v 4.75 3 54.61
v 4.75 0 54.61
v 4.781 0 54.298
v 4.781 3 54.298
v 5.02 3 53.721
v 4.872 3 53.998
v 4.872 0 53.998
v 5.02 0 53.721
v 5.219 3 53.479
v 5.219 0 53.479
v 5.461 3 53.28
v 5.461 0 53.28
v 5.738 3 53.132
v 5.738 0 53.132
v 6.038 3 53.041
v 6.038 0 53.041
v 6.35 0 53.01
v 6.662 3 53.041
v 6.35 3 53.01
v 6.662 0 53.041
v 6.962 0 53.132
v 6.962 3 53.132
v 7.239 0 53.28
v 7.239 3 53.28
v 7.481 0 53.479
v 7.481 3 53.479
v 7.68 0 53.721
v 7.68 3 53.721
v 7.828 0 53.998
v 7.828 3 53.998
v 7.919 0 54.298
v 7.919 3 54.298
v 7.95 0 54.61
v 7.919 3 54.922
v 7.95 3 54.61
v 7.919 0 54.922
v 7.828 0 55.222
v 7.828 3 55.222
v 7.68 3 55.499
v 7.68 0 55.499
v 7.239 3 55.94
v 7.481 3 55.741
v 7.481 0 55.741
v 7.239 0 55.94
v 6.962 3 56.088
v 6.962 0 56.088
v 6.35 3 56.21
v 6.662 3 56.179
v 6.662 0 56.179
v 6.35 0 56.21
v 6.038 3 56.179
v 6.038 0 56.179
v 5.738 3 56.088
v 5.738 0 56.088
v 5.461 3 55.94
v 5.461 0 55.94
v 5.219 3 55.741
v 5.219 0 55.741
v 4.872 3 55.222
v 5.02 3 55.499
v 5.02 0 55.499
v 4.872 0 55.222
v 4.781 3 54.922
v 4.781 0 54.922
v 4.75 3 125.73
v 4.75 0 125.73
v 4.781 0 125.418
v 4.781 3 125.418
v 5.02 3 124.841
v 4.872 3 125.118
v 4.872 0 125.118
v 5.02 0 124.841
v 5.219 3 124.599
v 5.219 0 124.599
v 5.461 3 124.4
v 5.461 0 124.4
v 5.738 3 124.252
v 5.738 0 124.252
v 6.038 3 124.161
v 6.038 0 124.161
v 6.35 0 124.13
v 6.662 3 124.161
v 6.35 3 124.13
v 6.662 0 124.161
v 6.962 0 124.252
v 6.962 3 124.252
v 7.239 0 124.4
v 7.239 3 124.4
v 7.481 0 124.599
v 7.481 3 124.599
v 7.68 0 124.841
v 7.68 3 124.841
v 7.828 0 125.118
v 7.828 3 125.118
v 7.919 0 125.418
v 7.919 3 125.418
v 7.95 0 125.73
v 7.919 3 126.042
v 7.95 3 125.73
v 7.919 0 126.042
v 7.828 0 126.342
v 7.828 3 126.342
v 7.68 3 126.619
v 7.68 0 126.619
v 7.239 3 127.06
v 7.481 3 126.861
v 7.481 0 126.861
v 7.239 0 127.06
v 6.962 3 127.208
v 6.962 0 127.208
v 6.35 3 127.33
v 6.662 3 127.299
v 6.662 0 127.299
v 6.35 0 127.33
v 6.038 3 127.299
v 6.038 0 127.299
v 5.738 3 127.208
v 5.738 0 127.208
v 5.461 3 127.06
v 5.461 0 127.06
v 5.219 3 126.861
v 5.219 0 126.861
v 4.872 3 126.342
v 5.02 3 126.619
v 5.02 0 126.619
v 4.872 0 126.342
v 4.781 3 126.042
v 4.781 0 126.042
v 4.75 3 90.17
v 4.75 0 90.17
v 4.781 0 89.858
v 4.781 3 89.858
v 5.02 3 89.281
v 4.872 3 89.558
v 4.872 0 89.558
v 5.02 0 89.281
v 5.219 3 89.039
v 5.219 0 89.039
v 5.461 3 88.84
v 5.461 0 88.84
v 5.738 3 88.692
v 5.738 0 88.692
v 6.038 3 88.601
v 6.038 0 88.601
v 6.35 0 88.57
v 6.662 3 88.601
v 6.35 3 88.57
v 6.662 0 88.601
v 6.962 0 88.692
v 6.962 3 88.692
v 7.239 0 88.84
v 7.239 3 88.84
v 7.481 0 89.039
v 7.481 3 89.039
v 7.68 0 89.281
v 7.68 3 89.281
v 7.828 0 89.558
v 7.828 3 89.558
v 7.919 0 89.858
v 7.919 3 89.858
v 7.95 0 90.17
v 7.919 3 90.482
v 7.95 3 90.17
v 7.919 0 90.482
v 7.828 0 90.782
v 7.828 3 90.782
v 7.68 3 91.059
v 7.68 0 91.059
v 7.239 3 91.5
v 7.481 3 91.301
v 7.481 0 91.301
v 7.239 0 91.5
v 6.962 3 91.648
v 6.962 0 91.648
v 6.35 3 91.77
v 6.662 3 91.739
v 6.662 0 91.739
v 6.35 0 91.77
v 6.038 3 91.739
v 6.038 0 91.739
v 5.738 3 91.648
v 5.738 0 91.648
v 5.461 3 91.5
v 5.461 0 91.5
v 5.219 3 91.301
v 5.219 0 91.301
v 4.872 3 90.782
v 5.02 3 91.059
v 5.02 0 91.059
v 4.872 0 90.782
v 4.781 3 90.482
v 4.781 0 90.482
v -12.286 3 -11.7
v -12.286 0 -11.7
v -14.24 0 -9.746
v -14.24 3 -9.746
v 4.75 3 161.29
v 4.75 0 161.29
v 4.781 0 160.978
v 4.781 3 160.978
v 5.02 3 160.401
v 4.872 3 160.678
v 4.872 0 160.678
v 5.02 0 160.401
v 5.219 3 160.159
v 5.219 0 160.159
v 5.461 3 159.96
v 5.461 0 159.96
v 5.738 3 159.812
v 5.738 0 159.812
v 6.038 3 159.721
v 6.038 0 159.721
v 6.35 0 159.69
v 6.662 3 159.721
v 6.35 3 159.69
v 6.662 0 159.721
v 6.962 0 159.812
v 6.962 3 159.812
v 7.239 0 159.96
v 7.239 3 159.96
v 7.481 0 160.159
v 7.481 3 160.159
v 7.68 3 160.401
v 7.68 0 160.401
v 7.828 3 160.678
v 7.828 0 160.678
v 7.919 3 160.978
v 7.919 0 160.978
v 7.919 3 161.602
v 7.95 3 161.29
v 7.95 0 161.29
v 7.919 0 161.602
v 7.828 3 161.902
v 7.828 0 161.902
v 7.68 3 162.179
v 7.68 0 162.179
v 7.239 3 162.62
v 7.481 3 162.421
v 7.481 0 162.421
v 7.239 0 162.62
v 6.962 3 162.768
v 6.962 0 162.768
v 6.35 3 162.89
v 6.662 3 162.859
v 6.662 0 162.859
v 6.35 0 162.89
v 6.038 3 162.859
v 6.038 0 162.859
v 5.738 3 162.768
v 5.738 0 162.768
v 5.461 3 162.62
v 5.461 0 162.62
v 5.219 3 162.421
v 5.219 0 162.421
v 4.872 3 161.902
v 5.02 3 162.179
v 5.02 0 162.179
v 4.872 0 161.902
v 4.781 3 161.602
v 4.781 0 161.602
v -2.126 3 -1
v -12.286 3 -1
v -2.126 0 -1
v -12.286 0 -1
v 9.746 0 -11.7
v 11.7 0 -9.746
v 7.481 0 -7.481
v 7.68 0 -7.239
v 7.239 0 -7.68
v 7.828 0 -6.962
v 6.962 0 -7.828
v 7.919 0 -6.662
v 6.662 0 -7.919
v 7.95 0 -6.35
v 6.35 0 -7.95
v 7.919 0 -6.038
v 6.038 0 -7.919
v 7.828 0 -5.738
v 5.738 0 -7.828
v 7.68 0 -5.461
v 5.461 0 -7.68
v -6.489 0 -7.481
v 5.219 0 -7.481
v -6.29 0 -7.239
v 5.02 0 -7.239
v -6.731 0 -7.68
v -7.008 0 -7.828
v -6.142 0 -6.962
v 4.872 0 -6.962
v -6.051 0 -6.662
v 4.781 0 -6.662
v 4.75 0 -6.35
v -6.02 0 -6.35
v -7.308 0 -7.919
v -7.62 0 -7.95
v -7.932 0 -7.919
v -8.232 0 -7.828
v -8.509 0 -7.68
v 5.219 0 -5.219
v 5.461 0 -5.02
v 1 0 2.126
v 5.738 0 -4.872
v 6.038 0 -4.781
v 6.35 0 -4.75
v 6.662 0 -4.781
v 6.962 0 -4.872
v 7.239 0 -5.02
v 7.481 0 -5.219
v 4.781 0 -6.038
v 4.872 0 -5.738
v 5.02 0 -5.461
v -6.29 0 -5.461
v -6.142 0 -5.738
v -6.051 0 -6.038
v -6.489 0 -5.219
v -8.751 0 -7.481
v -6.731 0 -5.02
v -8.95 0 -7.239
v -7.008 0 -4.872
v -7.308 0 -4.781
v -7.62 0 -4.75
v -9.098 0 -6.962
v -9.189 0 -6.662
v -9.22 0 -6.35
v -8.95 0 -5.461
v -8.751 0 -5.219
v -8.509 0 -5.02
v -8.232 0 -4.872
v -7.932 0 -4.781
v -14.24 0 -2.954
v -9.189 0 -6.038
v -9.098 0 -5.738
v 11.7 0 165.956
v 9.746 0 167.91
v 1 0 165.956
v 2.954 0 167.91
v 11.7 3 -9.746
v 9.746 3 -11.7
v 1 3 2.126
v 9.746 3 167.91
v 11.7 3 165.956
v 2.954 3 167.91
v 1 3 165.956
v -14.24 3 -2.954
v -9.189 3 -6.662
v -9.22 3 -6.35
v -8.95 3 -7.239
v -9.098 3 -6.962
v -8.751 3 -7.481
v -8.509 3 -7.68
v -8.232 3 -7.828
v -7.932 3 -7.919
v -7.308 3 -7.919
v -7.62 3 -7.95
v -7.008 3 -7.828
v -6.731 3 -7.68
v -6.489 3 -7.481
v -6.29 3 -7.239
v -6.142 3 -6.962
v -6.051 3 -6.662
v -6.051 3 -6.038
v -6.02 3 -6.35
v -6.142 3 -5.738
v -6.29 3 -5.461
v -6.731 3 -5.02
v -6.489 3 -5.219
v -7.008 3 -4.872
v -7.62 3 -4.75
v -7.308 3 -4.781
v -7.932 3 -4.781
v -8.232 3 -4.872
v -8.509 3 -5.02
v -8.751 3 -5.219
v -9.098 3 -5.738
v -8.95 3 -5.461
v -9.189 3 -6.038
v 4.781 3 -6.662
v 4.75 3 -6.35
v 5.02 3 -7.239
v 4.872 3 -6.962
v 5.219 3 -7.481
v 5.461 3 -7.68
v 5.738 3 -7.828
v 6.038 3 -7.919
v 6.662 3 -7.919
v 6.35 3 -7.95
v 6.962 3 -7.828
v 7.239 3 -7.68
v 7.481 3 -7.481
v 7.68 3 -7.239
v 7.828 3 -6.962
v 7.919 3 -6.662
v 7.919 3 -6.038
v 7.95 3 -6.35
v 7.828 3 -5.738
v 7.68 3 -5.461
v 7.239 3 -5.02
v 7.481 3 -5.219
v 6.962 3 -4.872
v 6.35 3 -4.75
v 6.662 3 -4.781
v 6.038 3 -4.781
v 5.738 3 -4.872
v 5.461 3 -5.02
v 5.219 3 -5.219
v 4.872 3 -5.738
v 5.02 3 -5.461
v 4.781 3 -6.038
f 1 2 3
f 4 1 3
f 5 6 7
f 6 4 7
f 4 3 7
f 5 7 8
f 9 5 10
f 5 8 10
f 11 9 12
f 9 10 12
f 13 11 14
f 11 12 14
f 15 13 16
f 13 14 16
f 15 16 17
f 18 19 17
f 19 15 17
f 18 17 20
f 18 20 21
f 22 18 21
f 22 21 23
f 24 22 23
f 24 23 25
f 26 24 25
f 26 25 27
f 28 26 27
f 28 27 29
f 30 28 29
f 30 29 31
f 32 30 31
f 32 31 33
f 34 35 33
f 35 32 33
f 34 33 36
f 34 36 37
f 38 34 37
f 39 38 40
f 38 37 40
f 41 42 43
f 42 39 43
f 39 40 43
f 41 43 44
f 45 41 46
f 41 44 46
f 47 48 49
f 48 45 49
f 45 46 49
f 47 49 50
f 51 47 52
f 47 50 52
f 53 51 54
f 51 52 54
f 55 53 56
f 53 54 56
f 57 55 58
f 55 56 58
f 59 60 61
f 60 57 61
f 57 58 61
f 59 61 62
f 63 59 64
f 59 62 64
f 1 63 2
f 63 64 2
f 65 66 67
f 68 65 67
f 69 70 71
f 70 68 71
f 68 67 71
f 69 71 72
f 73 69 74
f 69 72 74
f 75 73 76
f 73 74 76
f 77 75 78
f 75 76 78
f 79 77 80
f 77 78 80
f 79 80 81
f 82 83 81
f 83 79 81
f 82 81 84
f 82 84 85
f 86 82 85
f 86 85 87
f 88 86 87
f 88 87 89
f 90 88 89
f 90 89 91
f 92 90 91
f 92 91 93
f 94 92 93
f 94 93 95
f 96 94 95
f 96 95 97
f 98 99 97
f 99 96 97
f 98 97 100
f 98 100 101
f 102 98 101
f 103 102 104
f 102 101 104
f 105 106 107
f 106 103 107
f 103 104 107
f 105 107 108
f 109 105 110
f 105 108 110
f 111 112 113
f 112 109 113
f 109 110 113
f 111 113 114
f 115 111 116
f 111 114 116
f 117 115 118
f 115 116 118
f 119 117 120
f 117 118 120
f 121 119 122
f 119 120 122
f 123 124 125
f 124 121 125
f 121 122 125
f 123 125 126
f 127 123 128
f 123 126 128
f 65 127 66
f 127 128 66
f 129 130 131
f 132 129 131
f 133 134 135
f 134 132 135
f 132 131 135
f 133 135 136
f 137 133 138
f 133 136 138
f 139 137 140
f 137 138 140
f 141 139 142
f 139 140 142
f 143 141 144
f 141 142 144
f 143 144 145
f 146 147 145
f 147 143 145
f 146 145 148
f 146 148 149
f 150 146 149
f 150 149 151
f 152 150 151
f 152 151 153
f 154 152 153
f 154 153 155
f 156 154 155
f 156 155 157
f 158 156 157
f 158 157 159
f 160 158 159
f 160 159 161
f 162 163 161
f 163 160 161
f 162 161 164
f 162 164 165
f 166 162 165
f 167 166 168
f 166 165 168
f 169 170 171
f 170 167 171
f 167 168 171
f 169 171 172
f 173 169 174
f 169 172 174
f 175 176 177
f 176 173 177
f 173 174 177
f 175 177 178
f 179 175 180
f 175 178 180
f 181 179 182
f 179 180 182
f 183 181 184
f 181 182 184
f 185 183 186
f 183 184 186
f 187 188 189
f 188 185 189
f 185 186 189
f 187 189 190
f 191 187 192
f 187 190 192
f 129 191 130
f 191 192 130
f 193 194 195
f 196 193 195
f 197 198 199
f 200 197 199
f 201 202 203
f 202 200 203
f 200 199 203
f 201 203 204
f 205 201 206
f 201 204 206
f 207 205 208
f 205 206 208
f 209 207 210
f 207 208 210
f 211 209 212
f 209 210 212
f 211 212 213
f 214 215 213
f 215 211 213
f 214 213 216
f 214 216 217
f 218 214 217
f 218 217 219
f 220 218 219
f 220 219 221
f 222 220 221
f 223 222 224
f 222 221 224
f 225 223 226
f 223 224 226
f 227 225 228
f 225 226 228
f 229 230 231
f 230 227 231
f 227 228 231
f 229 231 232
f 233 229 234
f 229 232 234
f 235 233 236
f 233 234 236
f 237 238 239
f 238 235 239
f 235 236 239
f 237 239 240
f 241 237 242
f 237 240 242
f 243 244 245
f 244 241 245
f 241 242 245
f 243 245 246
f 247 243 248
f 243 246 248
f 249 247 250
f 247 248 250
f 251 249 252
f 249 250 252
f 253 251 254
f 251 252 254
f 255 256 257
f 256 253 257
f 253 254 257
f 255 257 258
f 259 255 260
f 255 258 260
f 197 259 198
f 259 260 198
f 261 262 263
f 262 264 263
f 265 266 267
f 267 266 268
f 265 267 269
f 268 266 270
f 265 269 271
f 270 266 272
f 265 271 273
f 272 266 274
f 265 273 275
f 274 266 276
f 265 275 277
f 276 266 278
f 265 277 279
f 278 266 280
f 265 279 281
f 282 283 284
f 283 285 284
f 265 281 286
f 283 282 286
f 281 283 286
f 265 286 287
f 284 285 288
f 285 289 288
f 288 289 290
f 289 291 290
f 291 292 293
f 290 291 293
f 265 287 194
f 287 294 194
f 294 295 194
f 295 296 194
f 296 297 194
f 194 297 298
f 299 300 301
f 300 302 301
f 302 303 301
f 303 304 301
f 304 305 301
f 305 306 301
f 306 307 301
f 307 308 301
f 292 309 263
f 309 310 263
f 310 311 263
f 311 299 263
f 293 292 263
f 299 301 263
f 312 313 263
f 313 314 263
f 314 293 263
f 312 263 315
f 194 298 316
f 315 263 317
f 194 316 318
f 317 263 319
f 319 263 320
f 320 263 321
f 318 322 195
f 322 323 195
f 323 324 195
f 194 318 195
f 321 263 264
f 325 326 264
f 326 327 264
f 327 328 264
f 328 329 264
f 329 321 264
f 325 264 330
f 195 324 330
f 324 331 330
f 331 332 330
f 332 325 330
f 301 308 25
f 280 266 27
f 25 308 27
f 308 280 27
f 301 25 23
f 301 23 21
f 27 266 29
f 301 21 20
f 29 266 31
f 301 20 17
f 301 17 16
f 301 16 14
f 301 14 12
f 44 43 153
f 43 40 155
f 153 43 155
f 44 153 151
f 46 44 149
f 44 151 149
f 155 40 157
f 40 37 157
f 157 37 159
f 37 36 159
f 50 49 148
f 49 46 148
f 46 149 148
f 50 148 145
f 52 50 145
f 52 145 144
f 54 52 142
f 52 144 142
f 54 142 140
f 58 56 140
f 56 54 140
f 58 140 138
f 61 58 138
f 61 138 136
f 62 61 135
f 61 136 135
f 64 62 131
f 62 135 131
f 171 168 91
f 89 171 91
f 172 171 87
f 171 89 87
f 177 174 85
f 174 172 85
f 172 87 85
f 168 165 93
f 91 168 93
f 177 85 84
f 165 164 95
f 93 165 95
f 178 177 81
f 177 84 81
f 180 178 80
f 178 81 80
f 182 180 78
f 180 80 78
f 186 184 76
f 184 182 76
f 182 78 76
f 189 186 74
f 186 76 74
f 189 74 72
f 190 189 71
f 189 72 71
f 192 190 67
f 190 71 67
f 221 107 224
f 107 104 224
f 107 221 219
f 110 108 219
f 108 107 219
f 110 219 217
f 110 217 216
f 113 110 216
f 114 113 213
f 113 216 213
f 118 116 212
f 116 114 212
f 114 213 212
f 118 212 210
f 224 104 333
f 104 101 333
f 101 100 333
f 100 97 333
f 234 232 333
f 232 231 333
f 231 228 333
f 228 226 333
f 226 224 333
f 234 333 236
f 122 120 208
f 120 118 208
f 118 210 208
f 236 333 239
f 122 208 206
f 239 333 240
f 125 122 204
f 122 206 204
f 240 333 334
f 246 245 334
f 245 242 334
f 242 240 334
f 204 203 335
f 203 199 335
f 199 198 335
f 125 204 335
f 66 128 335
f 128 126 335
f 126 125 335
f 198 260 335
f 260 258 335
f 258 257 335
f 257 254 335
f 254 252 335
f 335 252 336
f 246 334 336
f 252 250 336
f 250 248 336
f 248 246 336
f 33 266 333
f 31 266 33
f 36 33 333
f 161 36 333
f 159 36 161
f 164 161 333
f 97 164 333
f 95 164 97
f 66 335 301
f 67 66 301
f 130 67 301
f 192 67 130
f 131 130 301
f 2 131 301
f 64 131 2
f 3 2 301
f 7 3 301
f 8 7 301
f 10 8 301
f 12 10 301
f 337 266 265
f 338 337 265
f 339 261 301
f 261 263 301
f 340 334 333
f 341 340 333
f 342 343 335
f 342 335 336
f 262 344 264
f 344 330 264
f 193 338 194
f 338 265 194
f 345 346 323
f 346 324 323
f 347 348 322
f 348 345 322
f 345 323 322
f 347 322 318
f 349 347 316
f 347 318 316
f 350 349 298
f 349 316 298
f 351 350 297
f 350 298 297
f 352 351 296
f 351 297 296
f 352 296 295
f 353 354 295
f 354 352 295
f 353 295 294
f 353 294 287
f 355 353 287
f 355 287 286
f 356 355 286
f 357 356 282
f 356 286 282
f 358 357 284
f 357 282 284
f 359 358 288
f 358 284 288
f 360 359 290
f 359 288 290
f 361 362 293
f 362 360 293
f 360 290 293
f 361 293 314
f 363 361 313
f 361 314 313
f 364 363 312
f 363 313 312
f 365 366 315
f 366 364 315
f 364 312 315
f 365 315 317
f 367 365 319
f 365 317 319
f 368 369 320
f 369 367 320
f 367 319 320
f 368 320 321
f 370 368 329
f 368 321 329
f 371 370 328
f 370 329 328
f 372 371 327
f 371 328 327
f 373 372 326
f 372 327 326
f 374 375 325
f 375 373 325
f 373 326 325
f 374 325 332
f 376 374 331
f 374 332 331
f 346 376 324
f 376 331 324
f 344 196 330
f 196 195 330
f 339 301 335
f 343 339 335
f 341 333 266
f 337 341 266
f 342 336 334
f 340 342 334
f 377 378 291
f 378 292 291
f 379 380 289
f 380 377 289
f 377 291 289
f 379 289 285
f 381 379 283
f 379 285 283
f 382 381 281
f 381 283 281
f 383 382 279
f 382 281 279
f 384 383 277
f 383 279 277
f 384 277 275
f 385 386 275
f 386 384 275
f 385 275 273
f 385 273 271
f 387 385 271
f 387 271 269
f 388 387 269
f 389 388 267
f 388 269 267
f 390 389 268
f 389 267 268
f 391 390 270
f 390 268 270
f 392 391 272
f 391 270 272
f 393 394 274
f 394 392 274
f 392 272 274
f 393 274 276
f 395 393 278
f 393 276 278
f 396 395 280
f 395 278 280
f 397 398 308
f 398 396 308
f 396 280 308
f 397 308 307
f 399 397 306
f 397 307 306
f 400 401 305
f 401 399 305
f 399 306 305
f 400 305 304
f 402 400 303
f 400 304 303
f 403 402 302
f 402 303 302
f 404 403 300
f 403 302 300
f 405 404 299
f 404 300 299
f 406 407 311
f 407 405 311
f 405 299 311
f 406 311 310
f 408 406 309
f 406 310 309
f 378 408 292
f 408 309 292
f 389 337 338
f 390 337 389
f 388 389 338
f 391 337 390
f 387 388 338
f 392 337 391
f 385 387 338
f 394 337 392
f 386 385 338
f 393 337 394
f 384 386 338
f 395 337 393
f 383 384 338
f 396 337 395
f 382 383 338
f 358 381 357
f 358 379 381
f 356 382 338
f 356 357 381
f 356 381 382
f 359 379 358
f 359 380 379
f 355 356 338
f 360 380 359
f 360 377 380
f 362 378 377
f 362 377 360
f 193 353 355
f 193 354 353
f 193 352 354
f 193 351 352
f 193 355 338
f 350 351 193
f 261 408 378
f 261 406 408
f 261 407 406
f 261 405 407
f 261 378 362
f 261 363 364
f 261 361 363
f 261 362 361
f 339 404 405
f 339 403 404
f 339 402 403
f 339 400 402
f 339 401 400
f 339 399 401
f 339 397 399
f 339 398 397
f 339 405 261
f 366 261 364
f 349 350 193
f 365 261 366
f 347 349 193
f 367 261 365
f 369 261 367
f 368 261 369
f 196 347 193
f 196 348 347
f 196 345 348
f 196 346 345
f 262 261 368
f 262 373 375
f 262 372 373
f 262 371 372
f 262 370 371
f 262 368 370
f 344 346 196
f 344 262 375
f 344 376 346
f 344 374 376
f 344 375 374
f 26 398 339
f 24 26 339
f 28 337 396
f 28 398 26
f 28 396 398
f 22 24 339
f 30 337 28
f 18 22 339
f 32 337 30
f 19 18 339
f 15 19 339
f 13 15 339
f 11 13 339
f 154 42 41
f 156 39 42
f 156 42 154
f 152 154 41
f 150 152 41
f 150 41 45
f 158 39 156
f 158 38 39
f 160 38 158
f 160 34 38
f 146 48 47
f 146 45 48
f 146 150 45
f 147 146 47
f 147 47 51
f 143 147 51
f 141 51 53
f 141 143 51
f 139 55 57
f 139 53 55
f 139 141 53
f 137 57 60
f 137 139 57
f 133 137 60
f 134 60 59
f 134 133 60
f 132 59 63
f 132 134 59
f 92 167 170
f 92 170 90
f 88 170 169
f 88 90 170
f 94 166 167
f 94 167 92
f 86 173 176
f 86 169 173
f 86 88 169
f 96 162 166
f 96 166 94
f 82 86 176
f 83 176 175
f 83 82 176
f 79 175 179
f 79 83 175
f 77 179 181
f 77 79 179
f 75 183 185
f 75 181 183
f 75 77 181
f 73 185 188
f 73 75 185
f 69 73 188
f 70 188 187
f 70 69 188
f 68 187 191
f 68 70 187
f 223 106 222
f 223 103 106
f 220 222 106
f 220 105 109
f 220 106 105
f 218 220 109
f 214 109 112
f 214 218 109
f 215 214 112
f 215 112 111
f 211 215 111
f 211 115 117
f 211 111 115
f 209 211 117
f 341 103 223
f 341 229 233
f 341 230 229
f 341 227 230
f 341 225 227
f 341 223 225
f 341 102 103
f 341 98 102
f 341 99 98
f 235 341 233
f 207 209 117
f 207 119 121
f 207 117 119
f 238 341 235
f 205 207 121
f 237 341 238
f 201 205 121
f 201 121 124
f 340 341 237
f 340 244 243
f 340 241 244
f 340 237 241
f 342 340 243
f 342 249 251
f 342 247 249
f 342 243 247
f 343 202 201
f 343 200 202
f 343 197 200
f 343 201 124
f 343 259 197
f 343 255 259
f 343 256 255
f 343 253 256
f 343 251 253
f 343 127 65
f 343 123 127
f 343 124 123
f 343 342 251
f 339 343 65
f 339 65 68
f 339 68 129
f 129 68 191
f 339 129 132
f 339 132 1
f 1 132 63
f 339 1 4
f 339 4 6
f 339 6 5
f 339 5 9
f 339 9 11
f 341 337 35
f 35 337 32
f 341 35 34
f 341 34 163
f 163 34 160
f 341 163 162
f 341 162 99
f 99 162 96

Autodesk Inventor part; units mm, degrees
ref_plane "YZ Plane" through (0, 0, 0) normal (1, 0, 0) x (0, 1, 0)
ref_plane "XZ Plane" through (0, 0, 0) normal (0, 1, 0) x (-1, 0, 0)
ref_plane "XY Plane" through (0, 0, 0) normal (0, 0, 1) x (1, 0, 0)
sketch "Szkic1" plane through (0, 0, 0) normal (0, 1, 0) x (-1, 0, 0)
  line L0 (-12.7, 166.37) -> (-12.7, -10.16)
  line L1 (-10.16, -12.7) -> (12.7, -12.7)
  line L2 (15.24, -10.16) -> (15.24, -2.54)
  line L3 (12.7, 0) -> (2.54, 0)
  line L4 (0, 2.54) -> (0, 166.37)
  line L5 (-2.54, 168.91) -> (-10.16, 168.91)
  line L6 (-6.35, 168.91) -> (-6.35, -12.7) construction
  circle A0 centre (-6.35, 161.29) radius 1.6
  circle A1 centre (-6.35, 125.73) radius 1.6
  circle A2 centre (-6.35, 90.17) radius 1.6
  circle A3 centre (-6.35, 54.61) radius 1.6
  line L7 (15.24, -6.35) -> (-12.7, -6.35) construction
  circle A4 centre (7.62, -6.35) radius 1.6
  circle A5 centre (-6.35, -6.35) radius 1.6
  line L8 (-2.54, 168.91) -> (0, 166.37)
  line L9 (-10.16, 168.91) -> (-12.7, 166.37)
  line L10 (-12.7, -10.16) -> (-10.16, -12.7)
  line L11 (0, 2.54) -> (2.54, 0)
  line L12 (12.7, 0) -> (15.24, -2.54)
  line L13 (12.7, -12.7) -> (15.24, -10.16)
  line L14 (-1, 165.9558) -> (-2.9542, 167.91)
  line L15 (-2.9542, 167.91) -> (-9.7458, 167.91)
  line L16 (-9.7458, 167.91) -> (-11.7, 165.9558)
  line L17 (-11.7, 165.9558) -> (-11.7, -9.7458)
  line L18 (-11.7, -9.7458) -> (-9.7458, -11.7)
  line L19 (-9.7458, -11.7) -> (12.2858, -11.7)
  line L20 (12.2858, -11.7) -> (14.24, -9.7458)
  line L21 (14.24, -9.7458) -> (14.24, -2.9542)
  line L22 (14.24, -2.9542) -> (12.2858, -1)
  line L23 (12.2858, -1) -> (2.1258, -1)
  line L24 (2.1258, -1) -> (-1, 2.1258)
  line L25 (-1, 2.1258) -> (-1, 165.9558)
  point P0 (0, 0)
  point P1 (-12.7, 168.91)
  point P2 (-12.7, -12.7)
  point P3 (15.24, -12.7)
  point P4 (15.24, 0)
  point P5 (0, 0)
  point P6 (0, 168.91)
  dimension "d0" = 12.7
  dimension "d1" = 181.61
  dimension "d2" = 27.94
  dimension "d3" = 3.2
  dimension "d4" = 7.62
  dimension "d7" = 35.56
  dimension "d12" = 3.2
  dimension "d13" = 3.2
  dimension "d14" = 7.62
  dimension "d15" = 2.54
  dimension "d16" = 2.54
  dimension "d17" = 2.54
  dimension "d18" = 2.54
  dimension "d19" = 2.54
  dimension "d20" = 2.54
  dimension "d21" = 2.54
  dimension "d22" = 2.54
  dimension "d23" = 2.54
  dimension "d24" = 2.54
  dimension "d25" = 2.54
  dimension "d26" = 2.54
  dimension "d27" = 1
extrude "Wyciągnięcie proste2" add sketch "Szkic1" along normal blind 3 contours L25 L24 L23 L22 L21 L20 L19 L18 L17 L16 L15 L14
equation "\"d16\" = d15"
equation "\"d17\" = d15"
equation "\"d18\" = d17"
equation "\"d19\" = d15"
equation "\"d20\" = d19"
equation "\"d21\" = d15"
equation "\"d22\" = d21"
equation "\"d23\" = d15"
equation "\"d24\" = d23"
equation "\"d25\" = d15"
equation "\"d26\" = d25"
properties part number "bar_+BattPow"
